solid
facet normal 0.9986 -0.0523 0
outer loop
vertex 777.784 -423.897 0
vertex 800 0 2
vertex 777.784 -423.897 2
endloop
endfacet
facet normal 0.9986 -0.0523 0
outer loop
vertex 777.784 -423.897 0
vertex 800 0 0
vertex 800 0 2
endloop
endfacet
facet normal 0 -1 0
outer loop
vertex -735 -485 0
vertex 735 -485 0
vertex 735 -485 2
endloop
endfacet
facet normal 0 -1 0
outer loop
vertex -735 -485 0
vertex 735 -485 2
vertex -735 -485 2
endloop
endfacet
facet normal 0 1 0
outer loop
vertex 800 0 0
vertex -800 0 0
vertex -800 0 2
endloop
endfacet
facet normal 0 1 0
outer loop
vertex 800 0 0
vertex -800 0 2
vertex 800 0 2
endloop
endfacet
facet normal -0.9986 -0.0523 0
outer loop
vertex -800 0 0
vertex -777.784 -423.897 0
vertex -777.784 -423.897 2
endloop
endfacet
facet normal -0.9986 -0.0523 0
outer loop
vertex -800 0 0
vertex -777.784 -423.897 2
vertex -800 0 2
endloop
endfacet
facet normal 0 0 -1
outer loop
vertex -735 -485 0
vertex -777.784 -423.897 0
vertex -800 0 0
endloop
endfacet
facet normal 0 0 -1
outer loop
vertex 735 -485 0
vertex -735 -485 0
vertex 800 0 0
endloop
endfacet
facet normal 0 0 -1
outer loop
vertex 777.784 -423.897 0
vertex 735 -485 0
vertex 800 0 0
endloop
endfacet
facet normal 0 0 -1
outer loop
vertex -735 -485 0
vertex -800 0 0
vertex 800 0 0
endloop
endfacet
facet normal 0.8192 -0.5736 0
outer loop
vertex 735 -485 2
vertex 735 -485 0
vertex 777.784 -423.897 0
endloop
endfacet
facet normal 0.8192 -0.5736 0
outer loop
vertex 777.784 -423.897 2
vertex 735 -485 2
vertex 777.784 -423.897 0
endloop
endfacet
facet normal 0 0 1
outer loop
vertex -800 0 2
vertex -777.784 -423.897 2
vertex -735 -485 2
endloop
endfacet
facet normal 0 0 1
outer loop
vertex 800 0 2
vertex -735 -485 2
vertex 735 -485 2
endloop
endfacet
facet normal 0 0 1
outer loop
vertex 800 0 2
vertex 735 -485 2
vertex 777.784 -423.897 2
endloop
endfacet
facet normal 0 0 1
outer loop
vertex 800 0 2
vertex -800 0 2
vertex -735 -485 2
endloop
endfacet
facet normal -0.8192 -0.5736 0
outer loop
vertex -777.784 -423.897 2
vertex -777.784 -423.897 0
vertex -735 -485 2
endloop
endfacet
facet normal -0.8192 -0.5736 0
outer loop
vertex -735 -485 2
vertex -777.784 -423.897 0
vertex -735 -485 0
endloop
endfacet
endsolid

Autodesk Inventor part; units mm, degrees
ref_plane "YZ Plane" through (0, 0, 0) normal (1, 0, 0) x (0, 1, 0)
ref_plane "XZ Plane" through (0, 0, 0) normal (0, 1, 0) x (-1, 0, 0)
ref_plane "XY Plane" through (0, 0, 0) normal (0, 0, 1) x (1, 0, 0)
sketch "Sketch1" plane through (0, 0, 0) normal (0, 0, 1) x (1, 0, 0)
  line L0 (800, 0) -> (800, -485) construction
  line L1 (800, -485) -> (0, -485)
  line L2 (800, 0) -> (777.7845, -423.8974)
  line L3 (735, -485) -> (800, -392.1704)
  line L4 (0, -485) -> (0, 0)
  line L5 (0, 0) -> (800, 0)
  dimension "d9" = 800
  dimension "d10" = 35
  dimension "d11" = 485
  dimension "d12" = 3
  dimension "d13" = 65
extrude "Plate1" add sketch "Sketch1" along normal blind 2
mirror "Mirror1" about plane through (0, 0, 0) normal (1, 0, 0)
sketch "Sketch2" plane through (0, 0, 2) normal (0, 0, 1) x (1, 0, 0)
  line L0 (-55, -435) -> (-55, -423) construction
  line L1 (-55, -423) -> (55, -423) construction
  line L2 (55, -423) -> (55, -435) construction
  line L3 (55, -435) -> (-55, -435) construction
  line L4 (-735, -485) -> (735, -485) projected
  point P0 (0, 0)
  point P1 (0, -435)
  point P2 (0, -485)
  dimension "d6" = 12
  dimension "d7" = 110
  dimension "d8" = 50
mark "Mark1"
equation "\"d2\" = Thickness"
equation "\"BendReliefWidth\" = Thickness"
equation "\"BendReliefDepth\" = 0.5 * Thickness"
equation "\"CornerReliefSize\" = 4 * Thickness"
equation "\"MinimumRemnant\" = 2 * Thickness"
equation "\"TransitionRadius\" = BendRadius"
equation "\"JacobiRadiusSize\" = BendRadius"
equation "\"GapSize\" = Thickness"
equation "\"Thickness\" = 2"
equation "\"BendRadius\" = 2.75"
properties part number "MSC 703 FACE 3" material "AISI304"
